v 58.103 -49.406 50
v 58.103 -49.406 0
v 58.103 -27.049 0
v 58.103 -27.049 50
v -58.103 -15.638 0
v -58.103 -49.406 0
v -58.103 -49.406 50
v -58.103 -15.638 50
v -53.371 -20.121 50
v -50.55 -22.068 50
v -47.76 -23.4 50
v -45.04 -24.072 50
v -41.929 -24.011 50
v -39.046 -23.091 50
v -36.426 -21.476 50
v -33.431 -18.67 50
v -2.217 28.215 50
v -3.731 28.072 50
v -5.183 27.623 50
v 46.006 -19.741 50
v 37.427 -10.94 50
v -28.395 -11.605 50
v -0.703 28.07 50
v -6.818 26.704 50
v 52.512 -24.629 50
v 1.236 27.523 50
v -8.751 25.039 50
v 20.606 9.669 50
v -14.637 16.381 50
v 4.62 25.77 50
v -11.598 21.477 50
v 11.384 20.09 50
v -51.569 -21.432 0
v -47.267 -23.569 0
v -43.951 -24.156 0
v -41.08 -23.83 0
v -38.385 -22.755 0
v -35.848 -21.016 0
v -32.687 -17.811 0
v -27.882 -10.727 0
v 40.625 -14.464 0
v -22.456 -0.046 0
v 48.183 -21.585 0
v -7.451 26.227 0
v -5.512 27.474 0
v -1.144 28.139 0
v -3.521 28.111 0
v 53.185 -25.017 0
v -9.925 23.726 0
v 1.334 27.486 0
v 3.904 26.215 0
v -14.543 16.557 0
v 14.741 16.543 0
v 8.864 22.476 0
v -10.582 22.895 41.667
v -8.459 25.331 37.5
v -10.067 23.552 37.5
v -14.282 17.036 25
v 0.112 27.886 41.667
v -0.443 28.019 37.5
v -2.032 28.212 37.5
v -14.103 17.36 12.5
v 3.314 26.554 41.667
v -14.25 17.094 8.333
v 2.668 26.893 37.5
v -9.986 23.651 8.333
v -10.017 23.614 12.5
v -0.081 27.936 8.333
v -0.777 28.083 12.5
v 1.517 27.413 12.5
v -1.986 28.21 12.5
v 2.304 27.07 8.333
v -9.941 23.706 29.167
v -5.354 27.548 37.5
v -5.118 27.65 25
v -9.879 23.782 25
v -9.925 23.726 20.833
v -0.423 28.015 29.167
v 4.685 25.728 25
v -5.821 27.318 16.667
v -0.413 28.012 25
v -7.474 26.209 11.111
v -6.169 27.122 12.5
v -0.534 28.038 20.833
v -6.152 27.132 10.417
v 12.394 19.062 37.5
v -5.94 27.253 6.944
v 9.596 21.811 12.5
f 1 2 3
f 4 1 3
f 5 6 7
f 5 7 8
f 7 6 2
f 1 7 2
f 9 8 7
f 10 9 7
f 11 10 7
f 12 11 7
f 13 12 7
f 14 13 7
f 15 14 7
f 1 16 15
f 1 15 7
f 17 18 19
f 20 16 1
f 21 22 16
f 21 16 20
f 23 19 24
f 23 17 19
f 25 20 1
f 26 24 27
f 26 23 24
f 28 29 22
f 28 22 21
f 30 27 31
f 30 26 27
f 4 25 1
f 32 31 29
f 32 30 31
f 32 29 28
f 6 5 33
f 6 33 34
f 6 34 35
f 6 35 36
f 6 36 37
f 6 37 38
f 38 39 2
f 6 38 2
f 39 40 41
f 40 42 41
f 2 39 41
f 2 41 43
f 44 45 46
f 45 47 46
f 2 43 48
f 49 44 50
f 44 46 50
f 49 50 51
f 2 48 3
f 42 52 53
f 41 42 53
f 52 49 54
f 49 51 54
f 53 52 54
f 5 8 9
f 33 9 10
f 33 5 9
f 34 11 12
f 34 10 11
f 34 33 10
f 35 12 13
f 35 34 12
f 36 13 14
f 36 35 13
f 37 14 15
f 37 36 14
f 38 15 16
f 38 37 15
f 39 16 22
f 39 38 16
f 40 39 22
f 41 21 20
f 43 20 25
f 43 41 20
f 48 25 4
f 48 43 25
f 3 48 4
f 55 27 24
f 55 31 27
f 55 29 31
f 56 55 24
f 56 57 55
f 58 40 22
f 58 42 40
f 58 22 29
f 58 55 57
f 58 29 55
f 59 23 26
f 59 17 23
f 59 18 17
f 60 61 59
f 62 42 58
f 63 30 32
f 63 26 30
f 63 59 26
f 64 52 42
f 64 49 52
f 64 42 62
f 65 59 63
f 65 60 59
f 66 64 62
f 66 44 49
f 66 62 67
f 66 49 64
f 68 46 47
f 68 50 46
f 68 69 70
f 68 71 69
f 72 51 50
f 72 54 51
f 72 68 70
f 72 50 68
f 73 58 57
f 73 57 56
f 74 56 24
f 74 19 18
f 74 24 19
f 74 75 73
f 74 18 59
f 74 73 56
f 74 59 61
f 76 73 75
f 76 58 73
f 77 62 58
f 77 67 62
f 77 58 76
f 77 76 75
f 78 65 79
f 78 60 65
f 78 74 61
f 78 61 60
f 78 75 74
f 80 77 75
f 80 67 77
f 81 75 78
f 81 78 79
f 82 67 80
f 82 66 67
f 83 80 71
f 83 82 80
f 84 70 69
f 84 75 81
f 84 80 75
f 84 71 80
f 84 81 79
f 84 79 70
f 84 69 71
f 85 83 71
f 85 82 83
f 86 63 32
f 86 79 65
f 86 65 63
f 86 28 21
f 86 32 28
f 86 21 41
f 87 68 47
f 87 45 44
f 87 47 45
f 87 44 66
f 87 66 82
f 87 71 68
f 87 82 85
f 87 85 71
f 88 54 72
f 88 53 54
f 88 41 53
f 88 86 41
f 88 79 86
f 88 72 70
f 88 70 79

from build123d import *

# Parameters (mm, degrees)
SKETCH_1_W              = 116.205188512
SKETCH_1_H              = 98.81234538
EXTRUDE_1_DEPTH         = 50
SHEET_EXTRUDE_1_1_BACK  = 84
SHEET_EXTRUDE_1_1_DEPTH = 168


with BuildPart() as part:
    # 草图1 → 凸台-拉伸1 (new body)
    with BuildSketch(Plane.XY):
        Rectangle(SKETCH_1_W, SKETCH_1_H)
    extrude(amount=EXTRUDE_1_DEPTH)

    # Surface Cut 4: cut with a surface, the side behind it stays
    # Sheet 凸台-拉伸1: a surface, the sketch's curves swept straight by 168 mm
    with BuildLine(Plane.XY.offset(-SHEET_EXTRUDE_1_1_BACK), mode=Mode.PRIVATE) as sheet_extrude_1_1_path:
        add(Edge.make_bspline(
            [(-77.832747833, 15.553256185), (-31.295772713, -76.721233342), (-15.787269452, 142.067524092), (64.262091576, -94.605051275), (87.005180968, 18.477800083)],
            knots=[0, 0, 0, 0, 0.440401052, 1, 1, 1, 1], degree=3))
    sheet_extrude_1_1 = Shell.extrude(sheet_extrude_1_1_path.wire(), (0 * SHEET_EXTRUDE_1_1_DEPTH, 0 * SHEET_EXTRUDE_1_1_DEPTH, 1 * SHEET_EXTRUDE_1_1_DEPTH))
    split(bisect_by=sheet_extrude_1_1, keep=Keep.BOTTOM)


solid = part.part
